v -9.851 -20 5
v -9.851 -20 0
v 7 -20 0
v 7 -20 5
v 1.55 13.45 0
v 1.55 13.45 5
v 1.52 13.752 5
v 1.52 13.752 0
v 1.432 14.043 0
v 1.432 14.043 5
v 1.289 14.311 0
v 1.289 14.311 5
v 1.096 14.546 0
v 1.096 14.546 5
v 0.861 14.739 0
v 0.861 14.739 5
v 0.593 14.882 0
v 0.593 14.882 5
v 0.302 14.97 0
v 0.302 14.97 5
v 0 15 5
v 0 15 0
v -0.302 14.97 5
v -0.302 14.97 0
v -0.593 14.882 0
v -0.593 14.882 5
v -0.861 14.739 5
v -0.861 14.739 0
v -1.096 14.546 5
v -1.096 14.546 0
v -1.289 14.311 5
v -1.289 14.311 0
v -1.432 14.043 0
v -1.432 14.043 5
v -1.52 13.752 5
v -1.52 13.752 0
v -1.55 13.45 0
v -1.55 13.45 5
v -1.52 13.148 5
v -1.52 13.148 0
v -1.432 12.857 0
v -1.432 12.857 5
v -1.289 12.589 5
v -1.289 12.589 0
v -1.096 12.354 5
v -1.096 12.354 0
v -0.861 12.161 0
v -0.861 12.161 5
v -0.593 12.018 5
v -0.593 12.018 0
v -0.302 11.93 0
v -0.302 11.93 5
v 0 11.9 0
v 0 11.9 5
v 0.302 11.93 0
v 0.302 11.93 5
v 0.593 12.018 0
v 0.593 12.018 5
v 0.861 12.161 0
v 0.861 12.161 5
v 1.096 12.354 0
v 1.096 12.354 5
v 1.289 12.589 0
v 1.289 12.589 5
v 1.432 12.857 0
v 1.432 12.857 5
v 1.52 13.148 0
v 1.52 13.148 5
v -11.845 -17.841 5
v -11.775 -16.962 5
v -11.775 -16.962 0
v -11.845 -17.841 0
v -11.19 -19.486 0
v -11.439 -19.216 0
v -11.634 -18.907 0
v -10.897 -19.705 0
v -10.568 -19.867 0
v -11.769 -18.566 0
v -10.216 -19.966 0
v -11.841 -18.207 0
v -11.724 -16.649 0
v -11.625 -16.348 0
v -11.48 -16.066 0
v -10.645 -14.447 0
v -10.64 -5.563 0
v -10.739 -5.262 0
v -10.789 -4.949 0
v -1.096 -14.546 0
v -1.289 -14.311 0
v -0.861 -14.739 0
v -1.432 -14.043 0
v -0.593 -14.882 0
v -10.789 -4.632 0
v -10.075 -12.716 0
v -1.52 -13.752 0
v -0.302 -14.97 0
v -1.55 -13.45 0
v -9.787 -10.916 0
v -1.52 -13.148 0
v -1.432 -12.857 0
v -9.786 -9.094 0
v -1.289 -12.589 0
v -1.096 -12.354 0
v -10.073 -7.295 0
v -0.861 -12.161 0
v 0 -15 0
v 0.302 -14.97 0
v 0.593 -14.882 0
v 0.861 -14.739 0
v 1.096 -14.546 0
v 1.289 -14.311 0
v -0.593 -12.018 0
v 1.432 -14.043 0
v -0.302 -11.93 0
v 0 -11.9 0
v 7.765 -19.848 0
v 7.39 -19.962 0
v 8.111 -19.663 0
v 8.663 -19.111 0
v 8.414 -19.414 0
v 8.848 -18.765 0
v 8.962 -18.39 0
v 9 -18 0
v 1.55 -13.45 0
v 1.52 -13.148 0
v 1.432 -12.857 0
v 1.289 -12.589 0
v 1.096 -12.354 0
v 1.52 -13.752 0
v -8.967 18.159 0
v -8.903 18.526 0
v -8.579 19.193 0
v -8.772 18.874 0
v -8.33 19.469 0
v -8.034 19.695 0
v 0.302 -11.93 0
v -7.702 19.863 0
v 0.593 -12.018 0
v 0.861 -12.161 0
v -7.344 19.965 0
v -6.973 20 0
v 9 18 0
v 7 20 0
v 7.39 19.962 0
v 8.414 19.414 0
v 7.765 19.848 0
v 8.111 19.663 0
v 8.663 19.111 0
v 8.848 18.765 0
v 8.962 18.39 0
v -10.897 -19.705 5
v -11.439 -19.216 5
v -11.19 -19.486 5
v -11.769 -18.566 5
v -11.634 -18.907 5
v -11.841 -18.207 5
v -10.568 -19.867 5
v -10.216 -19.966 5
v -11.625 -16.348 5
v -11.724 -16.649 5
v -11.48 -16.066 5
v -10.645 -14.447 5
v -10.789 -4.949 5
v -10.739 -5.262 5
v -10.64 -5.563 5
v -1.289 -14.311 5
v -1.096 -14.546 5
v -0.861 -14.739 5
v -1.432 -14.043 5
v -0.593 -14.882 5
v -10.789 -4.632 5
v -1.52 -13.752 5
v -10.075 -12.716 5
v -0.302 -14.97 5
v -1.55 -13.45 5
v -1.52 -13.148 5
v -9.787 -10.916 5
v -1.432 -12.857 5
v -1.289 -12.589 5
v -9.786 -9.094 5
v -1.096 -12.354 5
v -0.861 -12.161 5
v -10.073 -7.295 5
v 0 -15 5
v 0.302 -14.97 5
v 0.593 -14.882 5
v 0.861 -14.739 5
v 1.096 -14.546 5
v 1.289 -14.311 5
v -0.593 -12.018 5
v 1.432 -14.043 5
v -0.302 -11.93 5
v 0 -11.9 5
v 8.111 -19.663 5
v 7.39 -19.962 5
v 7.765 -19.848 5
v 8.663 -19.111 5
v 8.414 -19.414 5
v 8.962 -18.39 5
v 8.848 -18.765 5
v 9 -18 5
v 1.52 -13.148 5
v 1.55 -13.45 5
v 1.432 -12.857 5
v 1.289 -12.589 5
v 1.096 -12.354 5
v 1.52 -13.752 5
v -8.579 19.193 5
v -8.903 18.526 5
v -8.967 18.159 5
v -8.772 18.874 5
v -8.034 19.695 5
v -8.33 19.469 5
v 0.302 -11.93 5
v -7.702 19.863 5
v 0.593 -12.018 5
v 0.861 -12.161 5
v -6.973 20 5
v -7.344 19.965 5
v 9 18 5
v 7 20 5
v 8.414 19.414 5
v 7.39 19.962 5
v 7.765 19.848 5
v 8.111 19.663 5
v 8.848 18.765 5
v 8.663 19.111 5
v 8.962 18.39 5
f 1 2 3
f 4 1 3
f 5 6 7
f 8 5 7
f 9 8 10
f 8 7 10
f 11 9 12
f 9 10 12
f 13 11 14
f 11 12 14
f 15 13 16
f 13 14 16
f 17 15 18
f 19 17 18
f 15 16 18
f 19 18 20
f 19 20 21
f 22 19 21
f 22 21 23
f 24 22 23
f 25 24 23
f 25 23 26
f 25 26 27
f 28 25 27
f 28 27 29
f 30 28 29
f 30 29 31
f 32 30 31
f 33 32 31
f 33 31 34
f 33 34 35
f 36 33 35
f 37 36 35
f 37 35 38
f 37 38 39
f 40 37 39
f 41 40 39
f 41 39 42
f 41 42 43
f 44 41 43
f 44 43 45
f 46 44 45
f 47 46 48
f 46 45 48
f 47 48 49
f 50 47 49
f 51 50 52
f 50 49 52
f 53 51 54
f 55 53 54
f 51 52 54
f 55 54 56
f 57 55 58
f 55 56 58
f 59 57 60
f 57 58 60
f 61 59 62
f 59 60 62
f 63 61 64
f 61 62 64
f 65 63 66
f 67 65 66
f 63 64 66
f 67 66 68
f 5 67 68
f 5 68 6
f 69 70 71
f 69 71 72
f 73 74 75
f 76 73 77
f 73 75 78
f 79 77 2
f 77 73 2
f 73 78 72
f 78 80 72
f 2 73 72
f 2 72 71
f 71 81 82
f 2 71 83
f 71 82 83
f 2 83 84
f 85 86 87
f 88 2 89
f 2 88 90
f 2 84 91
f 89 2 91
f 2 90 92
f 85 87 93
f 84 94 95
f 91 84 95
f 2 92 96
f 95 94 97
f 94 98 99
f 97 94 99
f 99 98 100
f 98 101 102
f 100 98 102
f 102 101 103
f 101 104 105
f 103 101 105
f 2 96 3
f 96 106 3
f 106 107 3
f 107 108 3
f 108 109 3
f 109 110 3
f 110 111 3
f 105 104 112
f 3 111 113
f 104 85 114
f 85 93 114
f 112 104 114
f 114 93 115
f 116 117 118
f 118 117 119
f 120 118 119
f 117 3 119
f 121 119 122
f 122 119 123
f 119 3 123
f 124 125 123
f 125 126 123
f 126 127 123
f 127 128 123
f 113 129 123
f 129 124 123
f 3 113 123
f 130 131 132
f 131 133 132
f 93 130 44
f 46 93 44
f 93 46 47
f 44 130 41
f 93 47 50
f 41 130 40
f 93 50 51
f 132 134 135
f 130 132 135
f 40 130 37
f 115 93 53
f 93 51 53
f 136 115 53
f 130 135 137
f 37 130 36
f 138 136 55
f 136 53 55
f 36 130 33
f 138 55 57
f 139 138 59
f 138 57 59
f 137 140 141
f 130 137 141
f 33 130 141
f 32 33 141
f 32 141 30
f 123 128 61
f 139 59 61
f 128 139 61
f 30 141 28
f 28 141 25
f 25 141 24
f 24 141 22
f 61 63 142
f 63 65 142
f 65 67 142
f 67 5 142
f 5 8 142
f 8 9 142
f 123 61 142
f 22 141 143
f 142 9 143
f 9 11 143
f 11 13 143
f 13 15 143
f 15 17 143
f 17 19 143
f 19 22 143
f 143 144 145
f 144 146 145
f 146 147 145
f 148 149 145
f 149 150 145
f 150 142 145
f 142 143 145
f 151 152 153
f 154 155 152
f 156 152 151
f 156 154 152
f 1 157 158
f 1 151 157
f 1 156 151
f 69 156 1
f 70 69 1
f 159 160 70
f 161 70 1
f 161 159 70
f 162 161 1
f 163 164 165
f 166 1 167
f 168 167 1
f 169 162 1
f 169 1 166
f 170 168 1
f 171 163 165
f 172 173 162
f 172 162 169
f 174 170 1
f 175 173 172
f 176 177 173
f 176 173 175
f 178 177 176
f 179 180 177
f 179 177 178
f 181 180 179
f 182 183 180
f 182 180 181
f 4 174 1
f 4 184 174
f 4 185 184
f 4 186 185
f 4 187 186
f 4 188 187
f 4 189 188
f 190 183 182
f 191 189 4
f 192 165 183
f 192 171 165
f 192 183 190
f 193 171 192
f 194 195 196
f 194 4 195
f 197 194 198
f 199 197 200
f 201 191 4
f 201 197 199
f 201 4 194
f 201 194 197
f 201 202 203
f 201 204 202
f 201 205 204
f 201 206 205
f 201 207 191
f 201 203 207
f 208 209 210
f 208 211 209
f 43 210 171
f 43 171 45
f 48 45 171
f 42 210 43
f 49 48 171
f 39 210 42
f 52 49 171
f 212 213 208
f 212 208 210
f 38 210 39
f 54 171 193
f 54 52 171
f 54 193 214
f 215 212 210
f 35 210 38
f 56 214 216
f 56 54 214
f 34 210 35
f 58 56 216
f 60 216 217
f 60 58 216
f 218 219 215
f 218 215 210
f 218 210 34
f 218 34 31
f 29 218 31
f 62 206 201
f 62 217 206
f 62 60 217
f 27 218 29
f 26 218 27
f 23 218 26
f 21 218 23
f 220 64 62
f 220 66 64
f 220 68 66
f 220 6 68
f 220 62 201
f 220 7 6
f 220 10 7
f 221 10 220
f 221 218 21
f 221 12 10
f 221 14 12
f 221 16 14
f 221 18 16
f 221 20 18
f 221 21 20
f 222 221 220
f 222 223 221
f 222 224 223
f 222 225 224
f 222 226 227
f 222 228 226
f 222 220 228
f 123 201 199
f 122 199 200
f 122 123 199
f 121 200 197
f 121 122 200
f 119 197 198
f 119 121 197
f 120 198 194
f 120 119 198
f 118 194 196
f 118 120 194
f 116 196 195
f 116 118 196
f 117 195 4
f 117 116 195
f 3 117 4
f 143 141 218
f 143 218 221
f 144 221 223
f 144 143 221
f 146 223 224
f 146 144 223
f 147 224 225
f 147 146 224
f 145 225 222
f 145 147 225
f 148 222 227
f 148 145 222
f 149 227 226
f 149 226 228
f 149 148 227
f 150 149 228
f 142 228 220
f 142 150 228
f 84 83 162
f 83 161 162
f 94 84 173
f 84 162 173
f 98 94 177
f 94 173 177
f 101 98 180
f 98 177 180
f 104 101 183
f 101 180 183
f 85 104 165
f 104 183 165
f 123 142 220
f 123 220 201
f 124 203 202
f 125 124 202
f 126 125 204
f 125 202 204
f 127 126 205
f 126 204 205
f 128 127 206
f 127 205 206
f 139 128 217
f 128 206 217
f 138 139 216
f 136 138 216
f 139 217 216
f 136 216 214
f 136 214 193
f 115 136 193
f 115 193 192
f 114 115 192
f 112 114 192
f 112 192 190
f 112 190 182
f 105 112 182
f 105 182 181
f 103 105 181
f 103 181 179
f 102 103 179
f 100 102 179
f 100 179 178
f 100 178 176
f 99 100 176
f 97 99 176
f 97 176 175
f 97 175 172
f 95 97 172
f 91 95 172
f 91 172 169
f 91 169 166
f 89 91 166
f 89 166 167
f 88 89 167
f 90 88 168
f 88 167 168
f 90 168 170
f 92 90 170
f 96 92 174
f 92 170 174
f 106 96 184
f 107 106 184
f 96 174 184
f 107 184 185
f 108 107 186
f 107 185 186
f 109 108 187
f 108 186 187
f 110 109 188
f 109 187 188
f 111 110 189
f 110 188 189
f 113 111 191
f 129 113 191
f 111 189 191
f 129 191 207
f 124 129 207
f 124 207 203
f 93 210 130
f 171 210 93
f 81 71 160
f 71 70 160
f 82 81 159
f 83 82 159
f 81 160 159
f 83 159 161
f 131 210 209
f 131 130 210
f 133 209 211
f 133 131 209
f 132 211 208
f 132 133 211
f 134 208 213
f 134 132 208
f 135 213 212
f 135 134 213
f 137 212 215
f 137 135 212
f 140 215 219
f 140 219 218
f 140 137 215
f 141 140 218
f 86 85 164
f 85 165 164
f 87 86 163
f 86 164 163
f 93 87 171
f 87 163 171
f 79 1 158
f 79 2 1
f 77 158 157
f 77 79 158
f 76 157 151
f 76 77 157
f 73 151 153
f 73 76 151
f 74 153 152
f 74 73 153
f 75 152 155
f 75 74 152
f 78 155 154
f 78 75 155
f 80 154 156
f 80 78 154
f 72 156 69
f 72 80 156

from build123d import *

# Parameters (mm, degrees)
SKETCH_1_W               = 30
SKETCH_1_H               = 40
EXTRUDE_1_DEPTH          = 5
CUT_EXTRUDE_1_DEPTH      = 800
SKETCH_3_R               = 1.55
CUT_EXTRUDE_2_DEPTH      = 10
FILLET_1_R               = 2
SKETCH_4_R               = 11.5
CUT_EXTRUDE_3_DEPTH      = 10
FILLET_2_R               = 2
CUT_EXTRUDE_5_DEPTH      = 26.495097568
CUT_EXTRUDE_5_DEPTH_BACK = 5
FILLET_4_R               = 2


with BuildPart() as part:
    # 草图1 → 凸台-拉伸1 (new body)
    with BuildSketch(Plane.XY):
        Rectangle(SKETCH_1_W, SKETCH_1_H)
    extrude(amount=EXTRUDE_1_DEPTH)

    # 草图2 → 切除-拉伸1 (cut)
    with BuildSketch(Plane.XY.offset(5)):
        Polygon((-8.819854033, 20), (-12.017512264, -20), (-15, -20), (-15, 20), align=None)
    extrude(amount=-CUT_EXTRUDE_1_DEPTH, mode=Mode.SUBTRACT)

    # 草图3 → 切除-拉伸2 (cut)
    with BuildSketch(Plane.XY.offset(5)):
        with Locations((0, 13.45)):
            Circle(SKETCH_3_R)
        with Locations((0, -13.45)):
            Circle(SKETCH_3_R)
    extrude(amount=-CUT_EXTRUDE_2_DEPTH, mode=Mode.SUBTRACT)

    # 圆角1
    fillet_1_edges = [part.edges().sort_by_distance(p)[0] for p in [
        (-12.017512264, -20, 2.5),
        (-8.819854033, 20, 2.5),
        (15, -20, 2.5),
        (15, 20, 2.5),
    ]]
    fillet(fillet_1_edges, radius=FILLET_1_R)

    # 草图4 → 切除-拉伸3 (cut)
    with BuildSketch(Plane.XY.offset(5)):
        with Locations((-21.25, -10)):
            Circle(SKETCH_4_R)
    extrude(amount=-CUT_EXTRUDE_3_DEPTH, mode=Mode.SUBTRACT)

    # 圆角2
    fillet_2_edges = [part.edges().sort_by_distance(p)[0] for p in [
        (-11.734337347, -16.457721291, 2.5),
        (-10.829264337, -5.136023413, 2.5),
    ]]
    fillet(fillet_2_edges, radius=FILLET_2_R)

    # 草图6 → 切除-拉伸5 (cut, two sides: drawn at the far end of the back side and taken through both)
    with BuildSketch(Plane.XY.offset(5).offset(-CUT_EXTRUDE_5_DEPTH_BACK)):
        Polygon((9, 120.21695141), (9, 20), (9, -20), (9, -120.21695141), (209.433902819, -120.21695141), (209.433902819, 120.21695141), align=None)
    extrude(amount=CUT_EXTRUDE_5_DEPTH + CUT_EXTRUDE_5_DEPTH_BACK, mode=Mode.SUBTRACT)

    # 圆角4
    fillet_4_edges = [part.edges().sort_by_distance(p)[0] for p in [
        (9, 20, 2.5),
        (9, -20, 2.5),
    ]]
    fillet(fillet_4_edges, radius=FILLET_4_R)


solid = part.part
